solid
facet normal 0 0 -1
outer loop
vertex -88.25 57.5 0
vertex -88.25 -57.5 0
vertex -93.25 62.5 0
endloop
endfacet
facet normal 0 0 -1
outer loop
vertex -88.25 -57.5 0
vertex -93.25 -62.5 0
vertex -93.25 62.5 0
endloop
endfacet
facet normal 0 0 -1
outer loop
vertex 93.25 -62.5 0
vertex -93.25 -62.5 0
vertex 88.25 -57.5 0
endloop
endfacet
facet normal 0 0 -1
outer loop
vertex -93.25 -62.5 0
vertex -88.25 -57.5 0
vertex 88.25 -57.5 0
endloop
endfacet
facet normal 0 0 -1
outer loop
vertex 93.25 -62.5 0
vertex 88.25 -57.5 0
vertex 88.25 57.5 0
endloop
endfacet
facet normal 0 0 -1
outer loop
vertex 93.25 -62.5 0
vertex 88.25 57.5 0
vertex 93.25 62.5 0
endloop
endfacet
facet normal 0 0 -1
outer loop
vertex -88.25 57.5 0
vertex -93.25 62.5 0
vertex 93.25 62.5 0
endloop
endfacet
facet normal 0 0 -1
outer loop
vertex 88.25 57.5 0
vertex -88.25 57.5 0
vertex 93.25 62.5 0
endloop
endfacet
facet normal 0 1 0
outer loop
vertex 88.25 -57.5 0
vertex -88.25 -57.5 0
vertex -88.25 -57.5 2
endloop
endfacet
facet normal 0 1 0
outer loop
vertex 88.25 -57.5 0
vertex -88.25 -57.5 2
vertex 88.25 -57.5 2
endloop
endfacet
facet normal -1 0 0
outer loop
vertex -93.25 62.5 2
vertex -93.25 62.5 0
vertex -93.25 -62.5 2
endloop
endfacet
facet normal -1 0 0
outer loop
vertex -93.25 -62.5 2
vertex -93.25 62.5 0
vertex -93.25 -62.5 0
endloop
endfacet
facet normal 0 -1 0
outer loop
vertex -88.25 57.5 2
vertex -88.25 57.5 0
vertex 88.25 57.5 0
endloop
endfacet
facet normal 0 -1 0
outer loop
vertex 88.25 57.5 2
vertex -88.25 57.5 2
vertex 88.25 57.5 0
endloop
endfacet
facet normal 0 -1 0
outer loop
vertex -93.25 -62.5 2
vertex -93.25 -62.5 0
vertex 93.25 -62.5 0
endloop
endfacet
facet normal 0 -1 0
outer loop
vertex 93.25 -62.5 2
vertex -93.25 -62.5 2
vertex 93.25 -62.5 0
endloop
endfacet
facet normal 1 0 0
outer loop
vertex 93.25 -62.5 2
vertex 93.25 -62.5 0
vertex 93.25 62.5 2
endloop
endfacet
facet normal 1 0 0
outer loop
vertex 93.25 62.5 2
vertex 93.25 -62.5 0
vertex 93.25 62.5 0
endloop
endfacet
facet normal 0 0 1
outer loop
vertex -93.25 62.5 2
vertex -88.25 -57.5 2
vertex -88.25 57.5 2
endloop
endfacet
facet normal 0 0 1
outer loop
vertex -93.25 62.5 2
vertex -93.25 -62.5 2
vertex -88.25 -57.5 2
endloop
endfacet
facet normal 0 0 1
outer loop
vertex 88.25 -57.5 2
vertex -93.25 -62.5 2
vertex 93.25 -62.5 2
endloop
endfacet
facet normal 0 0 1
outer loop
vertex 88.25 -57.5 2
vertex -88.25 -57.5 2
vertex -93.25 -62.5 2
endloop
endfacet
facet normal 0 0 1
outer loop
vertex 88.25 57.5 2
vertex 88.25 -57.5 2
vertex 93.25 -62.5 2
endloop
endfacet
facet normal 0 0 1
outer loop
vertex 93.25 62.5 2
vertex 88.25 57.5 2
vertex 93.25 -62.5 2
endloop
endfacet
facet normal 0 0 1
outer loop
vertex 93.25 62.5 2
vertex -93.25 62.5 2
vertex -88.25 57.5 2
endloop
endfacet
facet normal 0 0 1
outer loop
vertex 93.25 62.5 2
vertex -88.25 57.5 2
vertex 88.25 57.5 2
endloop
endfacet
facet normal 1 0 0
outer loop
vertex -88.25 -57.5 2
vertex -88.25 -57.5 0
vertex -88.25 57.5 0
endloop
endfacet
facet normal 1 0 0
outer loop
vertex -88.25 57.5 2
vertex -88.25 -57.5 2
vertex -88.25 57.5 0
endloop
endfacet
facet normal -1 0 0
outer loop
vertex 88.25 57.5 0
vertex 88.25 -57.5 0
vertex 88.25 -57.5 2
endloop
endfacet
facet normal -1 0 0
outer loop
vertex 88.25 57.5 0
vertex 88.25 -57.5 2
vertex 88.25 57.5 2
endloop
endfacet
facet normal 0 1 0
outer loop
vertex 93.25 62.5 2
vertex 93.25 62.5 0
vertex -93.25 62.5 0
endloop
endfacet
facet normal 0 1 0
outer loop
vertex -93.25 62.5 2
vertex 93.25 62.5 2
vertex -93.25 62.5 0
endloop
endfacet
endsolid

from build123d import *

# Parameters (mm, degrees)
F0_W     = 176.5
F0_H     = 115
F0_W_2   = 5
F0_H_2   = 5
F1_DEPTH = 2


with BuildPart() as f1:
    # F0 (on Top) → F1 (new body)
    with BuildSketch(Plane.XY):
        Polygon((-88.25, 62.5), (-88.25, 57.5), (-93.25, 57.5), (-93.25, -62.5), (93.25, -62.5), (93.25, 62.5), align=None)
        Rectangle(F0_W, F0_H, mode=Mode.SUBTRACT)
        with Locations((-90.75, 60)):
            Rectangle(F0_W_2, F0_H_2)
    extrude(amount=F1_DEPTH)


solid = f1.part
